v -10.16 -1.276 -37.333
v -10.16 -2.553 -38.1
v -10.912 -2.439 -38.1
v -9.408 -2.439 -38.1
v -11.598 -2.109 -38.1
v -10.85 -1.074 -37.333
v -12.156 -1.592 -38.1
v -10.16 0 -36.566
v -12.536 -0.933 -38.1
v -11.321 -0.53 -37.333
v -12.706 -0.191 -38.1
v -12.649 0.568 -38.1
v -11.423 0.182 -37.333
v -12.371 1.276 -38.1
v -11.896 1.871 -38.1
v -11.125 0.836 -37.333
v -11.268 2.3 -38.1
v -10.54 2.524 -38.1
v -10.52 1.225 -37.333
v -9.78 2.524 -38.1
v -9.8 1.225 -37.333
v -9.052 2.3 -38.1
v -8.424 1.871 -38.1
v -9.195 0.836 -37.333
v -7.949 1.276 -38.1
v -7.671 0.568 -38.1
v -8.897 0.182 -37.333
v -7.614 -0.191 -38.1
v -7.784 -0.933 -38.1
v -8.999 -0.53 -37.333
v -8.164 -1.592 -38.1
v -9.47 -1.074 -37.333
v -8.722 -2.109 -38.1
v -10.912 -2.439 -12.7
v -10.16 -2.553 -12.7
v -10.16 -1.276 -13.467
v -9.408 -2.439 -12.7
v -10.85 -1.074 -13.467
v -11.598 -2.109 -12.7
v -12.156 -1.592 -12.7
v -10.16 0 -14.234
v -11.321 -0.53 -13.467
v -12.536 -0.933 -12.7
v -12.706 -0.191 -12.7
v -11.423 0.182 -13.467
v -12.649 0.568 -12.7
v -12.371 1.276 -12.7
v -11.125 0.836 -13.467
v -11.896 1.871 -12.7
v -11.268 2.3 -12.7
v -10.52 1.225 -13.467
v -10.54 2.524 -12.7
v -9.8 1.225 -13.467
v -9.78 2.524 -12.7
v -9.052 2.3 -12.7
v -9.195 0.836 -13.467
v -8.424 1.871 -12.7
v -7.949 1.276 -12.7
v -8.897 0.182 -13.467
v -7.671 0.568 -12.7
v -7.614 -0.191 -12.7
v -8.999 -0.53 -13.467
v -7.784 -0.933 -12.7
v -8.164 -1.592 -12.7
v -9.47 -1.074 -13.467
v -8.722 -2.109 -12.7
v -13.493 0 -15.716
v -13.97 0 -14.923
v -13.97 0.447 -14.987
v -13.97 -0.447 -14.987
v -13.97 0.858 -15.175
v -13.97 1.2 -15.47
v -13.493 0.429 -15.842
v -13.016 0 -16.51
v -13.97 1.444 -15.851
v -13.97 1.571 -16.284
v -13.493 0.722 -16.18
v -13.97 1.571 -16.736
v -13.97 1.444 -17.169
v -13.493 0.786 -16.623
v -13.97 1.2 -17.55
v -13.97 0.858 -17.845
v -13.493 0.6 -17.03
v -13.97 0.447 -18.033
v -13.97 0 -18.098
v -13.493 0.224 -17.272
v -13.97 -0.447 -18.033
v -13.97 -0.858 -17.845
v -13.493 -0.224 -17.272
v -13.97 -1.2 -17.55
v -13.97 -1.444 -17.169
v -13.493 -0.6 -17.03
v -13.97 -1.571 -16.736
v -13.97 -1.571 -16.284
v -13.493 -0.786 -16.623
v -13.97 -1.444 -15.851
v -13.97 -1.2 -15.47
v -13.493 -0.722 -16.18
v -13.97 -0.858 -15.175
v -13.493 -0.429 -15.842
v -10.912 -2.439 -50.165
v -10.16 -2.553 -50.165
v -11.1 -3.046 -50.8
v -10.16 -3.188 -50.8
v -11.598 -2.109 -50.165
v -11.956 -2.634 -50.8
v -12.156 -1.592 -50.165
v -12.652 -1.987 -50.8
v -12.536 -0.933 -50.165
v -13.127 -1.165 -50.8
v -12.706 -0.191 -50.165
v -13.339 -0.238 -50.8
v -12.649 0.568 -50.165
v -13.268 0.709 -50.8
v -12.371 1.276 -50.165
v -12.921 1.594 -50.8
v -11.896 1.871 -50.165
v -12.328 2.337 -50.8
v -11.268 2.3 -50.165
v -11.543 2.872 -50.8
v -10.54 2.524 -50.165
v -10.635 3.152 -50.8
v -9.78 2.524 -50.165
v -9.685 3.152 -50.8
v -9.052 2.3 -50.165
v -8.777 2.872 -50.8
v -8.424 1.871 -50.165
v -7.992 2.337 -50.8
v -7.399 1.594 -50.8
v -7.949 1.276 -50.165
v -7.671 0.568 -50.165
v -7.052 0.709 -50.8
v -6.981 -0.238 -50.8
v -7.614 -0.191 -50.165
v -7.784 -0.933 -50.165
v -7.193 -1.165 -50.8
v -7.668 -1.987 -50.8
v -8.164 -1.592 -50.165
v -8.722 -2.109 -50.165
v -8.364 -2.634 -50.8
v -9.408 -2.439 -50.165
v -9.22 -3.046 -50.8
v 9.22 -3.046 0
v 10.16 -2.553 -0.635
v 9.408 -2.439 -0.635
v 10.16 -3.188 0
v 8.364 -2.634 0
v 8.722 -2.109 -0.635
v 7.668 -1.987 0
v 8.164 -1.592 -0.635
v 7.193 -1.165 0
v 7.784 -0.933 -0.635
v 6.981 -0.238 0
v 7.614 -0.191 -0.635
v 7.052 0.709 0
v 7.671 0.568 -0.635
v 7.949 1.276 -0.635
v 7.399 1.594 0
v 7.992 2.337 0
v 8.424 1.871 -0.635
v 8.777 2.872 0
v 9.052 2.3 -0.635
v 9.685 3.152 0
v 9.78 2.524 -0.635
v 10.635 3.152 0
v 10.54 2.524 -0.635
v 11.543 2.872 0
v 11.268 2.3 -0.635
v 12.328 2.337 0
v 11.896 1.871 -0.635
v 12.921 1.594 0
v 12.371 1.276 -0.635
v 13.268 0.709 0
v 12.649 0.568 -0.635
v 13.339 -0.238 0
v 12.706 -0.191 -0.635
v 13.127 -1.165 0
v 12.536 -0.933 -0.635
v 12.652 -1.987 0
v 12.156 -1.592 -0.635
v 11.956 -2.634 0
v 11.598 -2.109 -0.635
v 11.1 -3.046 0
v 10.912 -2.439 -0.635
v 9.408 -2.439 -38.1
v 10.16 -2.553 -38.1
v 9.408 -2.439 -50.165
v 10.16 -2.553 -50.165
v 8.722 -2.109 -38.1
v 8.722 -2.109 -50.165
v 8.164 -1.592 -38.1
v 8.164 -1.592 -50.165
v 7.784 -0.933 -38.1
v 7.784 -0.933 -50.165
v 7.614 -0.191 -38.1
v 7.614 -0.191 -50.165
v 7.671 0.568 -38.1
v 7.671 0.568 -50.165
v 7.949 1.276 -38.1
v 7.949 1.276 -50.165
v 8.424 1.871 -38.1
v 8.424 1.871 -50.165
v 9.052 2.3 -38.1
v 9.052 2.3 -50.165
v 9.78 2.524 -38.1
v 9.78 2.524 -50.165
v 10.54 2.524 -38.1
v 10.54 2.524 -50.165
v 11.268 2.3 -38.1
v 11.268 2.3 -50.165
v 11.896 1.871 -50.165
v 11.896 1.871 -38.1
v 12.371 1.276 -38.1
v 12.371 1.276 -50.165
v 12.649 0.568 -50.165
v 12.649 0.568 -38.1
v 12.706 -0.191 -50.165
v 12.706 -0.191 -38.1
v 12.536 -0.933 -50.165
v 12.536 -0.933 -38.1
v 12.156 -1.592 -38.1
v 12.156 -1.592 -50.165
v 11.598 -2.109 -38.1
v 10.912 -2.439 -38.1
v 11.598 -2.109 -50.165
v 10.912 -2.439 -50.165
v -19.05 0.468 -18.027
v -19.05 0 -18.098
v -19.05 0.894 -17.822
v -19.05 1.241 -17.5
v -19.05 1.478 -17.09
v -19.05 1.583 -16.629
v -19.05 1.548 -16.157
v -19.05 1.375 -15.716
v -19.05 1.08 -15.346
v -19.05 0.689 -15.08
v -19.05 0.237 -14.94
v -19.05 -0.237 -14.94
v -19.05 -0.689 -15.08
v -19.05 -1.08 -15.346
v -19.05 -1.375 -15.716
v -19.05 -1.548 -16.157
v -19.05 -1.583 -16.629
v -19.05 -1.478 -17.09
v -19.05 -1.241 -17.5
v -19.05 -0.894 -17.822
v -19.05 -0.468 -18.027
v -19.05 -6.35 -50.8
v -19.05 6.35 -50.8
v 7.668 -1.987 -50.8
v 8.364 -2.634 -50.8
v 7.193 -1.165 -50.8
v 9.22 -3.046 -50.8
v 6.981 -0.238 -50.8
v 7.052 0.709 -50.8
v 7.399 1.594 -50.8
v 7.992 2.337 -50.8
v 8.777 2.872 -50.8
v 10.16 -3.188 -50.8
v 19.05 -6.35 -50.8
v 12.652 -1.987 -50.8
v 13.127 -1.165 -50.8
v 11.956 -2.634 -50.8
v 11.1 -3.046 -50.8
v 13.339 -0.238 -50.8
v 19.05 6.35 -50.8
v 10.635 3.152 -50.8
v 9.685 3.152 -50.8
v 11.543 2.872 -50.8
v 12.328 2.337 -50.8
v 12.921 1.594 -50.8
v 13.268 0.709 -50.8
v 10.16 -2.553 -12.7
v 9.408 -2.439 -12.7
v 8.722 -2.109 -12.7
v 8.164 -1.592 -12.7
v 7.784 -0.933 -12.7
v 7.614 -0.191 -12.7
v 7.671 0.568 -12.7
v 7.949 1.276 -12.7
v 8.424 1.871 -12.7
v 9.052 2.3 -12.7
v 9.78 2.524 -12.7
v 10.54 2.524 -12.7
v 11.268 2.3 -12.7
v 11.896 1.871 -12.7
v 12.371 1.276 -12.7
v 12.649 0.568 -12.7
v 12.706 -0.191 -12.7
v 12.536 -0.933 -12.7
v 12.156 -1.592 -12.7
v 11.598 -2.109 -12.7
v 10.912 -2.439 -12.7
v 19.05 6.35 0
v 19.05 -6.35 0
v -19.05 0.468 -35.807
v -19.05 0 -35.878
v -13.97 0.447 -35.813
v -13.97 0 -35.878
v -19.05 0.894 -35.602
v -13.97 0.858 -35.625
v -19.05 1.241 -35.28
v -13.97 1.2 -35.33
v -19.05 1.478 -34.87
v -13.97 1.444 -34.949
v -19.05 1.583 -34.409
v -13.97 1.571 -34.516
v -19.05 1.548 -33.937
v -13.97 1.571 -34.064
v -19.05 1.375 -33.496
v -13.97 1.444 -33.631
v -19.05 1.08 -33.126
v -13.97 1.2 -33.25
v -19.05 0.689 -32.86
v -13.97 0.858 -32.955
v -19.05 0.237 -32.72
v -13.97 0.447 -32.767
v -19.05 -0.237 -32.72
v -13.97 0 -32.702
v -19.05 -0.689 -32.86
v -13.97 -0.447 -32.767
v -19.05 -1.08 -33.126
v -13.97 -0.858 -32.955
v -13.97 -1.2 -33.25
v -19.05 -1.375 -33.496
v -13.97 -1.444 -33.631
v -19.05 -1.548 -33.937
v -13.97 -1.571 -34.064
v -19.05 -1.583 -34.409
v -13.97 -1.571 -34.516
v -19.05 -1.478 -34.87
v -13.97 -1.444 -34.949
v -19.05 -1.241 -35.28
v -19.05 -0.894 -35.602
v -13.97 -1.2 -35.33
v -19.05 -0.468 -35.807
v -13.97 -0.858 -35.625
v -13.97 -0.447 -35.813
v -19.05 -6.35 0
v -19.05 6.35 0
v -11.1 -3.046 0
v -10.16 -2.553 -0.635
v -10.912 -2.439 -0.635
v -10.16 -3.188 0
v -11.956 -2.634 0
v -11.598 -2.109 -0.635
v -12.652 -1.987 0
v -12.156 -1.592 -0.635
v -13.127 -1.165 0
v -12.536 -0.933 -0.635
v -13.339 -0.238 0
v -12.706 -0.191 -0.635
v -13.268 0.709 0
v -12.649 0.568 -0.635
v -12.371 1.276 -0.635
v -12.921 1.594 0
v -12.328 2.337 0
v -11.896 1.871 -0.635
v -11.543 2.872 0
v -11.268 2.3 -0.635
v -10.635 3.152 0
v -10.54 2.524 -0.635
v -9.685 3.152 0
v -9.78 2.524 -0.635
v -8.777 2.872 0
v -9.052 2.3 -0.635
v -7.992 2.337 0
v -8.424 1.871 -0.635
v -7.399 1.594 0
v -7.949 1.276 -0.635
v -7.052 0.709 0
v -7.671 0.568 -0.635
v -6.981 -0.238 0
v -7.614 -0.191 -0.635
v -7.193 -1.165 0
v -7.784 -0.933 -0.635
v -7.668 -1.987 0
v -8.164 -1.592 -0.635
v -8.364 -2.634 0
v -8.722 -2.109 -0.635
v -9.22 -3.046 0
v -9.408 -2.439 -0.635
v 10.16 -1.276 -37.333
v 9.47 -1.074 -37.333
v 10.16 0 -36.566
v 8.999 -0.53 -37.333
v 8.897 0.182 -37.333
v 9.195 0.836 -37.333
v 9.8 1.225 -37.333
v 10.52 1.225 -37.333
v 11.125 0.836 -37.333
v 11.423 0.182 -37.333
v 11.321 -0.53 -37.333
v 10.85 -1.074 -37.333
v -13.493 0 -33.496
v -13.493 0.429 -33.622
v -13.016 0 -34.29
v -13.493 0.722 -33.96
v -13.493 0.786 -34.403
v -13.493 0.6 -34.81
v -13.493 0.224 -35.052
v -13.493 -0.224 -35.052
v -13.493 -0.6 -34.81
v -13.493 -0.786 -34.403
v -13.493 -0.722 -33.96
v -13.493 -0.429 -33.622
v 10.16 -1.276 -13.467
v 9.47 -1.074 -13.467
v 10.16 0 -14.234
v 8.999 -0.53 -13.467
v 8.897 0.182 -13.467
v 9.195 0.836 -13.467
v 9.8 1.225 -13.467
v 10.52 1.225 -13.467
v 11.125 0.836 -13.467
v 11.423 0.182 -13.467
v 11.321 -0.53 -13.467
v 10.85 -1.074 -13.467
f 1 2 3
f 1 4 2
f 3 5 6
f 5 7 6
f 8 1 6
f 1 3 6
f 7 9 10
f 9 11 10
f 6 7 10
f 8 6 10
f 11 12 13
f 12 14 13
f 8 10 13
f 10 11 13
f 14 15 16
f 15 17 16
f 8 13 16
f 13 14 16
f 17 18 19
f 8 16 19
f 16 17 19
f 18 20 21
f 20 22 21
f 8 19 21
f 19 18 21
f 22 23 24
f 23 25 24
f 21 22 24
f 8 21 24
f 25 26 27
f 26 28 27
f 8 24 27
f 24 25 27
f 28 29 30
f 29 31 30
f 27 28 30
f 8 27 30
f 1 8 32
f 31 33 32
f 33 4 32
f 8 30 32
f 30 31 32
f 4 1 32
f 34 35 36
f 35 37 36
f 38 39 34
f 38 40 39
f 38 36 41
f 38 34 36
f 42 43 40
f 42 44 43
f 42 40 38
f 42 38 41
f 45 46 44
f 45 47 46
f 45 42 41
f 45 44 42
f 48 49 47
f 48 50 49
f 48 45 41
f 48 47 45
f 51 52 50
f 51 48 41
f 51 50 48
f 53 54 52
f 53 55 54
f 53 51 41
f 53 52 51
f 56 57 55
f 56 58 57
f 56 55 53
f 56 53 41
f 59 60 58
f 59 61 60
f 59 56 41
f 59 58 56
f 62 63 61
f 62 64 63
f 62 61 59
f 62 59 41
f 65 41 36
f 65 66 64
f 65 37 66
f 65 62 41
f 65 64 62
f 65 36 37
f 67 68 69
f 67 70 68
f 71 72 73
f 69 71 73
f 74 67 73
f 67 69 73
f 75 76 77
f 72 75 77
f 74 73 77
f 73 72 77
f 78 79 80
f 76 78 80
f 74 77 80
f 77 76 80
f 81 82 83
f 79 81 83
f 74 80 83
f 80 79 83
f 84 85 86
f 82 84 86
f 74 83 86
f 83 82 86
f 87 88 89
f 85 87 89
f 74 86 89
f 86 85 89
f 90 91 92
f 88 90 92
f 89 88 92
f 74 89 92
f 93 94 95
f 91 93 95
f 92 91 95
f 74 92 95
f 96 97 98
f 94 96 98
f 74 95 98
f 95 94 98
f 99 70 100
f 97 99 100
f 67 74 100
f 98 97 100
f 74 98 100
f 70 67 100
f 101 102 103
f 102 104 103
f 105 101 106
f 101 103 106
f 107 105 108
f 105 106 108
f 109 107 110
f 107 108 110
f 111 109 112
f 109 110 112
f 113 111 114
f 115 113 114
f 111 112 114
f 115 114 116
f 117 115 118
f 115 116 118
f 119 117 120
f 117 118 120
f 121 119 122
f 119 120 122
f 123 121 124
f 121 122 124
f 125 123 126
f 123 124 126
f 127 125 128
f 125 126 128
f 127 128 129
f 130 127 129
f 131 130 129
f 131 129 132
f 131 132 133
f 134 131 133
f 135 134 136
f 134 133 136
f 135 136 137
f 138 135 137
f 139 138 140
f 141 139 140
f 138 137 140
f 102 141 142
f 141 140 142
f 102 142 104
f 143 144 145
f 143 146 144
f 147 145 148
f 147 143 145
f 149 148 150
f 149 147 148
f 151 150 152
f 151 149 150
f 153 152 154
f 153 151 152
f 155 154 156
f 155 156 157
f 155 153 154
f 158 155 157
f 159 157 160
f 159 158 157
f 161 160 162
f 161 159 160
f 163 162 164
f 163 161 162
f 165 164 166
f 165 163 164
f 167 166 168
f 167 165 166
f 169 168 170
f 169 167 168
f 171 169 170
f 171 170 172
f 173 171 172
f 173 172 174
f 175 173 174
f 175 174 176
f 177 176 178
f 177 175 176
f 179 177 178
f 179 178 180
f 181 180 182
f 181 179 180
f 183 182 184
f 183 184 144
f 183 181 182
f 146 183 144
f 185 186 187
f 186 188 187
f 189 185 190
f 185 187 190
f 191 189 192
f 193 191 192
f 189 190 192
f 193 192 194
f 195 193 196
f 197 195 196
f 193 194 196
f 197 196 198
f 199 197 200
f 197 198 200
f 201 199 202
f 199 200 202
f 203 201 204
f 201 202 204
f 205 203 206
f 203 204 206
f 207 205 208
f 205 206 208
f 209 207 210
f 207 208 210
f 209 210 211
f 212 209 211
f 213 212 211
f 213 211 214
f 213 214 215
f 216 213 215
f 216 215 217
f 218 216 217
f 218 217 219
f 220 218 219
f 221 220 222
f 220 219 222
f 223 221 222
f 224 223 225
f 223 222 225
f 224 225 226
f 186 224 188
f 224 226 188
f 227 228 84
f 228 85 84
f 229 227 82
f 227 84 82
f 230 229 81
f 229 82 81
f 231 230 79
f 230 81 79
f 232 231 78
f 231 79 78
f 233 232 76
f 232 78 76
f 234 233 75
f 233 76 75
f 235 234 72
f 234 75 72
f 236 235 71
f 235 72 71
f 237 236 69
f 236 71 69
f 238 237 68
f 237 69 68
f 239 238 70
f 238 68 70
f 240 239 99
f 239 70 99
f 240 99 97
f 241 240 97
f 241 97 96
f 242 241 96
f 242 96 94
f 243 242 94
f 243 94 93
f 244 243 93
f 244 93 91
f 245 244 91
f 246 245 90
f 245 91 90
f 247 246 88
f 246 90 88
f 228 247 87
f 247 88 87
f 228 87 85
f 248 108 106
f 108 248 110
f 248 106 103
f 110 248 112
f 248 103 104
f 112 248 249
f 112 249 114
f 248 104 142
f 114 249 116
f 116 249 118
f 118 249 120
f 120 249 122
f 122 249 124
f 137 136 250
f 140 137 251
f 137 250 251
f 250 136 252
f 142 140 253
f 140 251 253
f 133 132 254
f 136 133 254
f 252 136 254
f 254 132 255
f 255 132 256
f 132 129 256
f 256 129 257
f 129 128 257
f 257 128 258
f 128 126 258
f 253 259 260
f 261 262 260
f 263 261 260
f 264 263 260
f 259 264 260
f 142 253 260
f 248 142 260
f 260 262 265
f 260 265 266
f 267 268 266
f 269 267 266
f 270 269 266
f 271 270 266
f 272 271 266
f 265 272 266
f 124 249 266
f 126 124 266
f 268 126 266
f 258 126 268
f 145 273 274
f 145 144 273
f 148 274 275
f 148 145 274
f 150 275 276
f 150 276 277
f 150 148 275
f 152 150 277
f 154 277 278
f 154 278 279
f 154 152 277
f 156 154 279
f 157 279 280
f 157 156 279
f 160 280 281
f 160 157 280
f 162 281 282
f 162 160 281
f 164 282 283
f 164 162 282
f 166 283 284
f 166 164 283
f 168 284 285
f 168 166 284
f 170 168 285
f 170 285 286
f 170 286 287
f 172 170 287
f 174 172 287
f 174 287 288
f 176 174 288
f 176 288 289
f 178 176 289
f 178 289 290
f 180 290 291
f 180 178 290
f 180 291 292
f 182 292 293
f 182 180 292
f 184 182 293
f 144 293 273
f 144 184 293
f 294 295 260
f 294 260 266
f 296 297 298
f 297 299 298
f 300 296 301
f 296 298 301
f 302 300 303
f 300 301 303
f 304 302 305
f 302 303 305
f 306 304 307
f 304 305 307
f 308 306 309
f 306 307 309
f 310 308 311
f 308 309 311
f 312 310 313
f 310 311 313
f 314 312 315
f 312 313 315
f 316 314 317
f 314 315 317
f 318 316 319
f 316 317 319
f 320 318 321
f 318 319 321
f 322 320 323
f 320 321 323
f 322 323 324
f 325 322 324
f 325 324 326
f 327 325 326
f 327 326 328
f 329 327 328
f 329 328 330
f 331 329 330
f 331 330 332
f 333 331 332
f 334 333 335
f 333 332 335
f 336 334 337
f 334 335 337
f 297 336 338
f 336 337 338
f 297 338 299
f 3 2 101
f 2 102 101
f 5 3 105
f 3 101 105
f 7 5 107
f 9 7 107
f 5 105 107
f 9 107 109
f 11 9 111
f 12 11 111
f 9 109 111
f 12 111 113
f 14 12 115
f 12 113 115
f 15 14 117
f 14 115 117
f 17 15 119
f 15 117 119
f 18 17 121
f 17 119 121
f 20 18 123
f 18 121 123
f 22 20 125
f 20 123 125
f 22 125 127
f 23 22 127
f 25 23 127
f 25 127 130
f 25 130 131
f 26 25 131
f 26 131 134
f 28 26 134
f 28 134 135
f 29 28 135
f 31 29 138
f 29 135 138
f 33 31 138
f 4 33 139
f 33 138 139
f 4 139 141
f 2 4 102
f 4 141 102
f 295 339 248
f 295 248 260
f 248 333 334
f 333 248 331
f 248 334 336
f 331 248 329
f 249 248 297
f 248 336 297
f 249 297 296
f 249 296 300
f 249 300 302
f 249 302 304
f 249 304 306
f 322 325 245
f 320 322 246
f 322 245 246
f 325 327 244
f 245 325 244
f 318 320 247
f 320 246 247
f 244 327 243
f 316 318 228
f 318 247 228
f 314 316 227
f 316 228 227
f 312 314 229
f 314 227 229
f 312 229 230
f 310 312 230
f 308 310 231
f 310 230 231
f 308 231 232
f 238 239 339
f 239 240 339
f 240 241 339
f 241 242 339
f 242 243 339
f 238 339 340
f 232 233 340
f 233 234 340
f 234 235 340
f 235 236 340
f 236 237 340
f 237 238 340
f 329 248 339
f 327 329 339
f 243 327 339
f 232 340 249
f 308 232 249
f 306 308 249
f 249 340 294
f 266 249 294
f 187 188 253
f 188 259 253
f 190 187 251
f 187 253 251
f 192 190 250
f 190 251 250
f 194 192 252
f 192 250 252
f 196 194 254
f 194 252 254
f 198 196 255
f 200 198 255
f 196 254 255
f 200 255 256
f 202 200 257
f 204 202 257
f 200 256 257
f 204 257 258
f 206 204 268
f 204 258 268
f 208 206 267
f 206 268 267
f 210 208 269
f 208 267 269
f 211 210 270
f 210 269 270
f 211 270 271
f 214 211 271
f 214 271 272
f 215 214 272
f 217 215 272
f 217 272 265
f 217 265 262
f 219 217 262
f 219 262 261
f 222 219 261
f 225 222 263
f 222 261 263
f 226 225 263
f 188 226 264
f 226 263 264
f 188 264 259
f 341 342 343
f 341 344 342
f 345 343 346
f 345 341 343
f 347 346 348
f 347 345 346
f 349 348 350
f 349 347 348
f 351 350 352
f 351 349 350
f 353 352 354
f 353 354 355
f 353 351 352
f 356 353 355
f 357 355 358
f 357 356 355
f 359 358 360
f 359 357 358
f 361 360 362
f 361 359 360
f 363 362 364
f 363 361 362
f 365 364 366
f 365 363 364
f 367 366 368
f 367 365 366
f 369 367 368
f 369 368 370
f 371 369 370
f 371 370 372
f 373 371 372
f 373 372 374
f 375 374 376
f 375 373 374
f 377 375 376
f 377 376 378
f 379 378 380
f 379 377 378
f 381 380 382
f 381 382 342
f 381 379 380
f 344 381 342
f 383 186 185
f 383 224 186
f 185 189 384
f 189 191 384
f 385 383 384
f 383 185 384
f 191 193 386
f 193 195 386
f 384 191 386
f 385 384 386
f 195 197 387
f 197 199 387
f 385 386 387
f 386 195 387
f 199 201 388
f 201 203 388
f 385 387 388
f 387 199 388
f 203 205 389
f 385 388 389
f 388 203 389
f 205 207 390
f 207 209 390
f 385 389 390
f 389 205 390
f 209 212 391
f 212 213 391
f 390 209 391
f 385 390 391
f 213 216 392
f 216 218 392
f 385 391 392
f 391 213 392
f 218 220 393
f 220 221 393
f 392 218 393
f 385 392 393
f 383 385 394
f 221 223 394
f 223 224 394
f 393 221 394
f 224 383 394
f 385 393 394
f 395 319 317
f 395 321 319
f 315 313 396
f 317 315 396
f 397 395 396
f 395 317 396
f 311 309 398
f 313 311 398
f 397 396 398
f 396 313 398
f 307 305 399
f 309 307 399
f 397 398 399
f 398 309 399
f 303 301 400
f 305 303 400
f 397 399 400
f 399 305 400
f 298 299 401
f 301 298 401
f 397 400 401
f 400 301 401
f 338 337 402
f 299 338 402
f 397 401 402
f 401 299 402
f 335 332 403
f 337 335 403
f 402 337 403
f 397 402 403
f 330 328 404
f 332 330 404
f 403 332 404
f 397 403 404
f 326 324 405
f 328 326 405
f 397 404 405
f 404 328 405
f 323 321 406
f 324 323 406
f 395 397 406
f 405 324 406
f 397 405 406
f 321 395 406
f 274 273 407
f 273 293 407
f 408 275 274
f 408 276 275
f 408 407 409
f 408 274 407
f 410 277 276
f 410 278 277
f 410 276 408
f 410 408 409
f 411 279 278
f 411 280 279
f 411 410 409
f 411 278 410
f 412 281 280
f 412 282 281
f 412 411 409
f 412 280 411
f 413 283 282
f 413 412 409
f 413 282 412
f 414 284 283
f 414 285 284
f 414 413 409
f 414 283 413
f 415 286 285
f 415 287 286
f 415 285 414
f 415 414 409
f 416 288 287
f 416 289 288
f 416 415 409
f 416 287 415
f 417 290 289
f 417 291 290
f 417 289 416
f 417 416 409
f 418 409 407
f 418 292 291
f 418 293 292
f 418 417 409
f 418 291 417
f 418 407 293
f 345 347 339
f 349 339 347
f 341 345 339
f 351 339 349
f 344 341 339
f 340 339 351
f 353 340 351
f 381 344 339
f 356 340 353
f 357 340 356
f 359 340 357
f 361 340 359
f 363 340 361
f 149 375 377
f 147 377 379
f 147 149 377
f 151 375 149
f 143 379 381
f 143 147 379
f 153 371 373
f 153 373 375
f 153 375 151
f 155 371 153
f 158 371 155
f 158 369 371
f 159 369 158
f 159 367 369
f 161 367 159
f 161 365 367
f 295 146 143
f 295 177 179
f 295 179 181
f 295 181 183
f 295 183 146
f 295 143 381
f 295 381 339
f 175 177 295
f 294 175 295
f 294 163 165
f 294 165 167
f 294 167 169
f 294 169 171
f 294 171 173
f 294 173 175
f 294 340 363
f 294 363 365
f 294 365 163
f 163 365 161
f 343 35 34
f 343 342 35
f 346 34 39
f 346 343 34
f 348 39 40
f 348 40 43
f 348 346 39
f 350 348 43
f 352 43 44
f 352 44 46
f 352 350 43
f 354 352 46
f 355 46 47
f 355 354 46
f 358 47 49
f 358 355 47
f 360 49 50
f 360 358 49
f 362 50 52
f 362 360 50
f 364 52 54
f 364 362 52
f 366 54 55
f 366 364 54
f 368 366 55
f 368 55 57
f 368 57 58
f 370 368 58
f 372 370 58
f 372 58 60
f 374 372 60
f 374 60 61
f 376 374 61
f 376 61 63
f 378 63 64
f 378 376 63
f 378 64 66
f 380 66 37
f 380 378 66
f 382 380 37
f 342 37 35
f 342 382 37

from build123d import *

# Parameters (mm, degrees)
SKETCH1_W                        = 38.1
SKETCH1_H                        = 12.7
BOSS_EXTRUDE1_DEPTH              = 50.8
F_1_4_20_TAPPED_HOLE1_AT_2_COUNT = 2
F_1_4_20_TAPPED_HOLE1_AT_2_PITCH = 20.32
F_1_8_0_125_DIAMETER_HOLE1_D     = 3.175
F_1_8_0_125_DIAMETER_HOLE1_DEPTH = 5.08
F_1_8_0_125_DIAMETER_HOLE1_TIP   = 0.953866233


with BuildPart() as part:
    # Sketch1 → Boss-Extrude1 (new body)
    with BuildSketch(Plane.XY):
        Rectangle(SKETCH1_W, SKETCH1_H)
    extrude(amount=-BOSS_EXTRUDE1_DEPTH)

    # Sketch4 → 1/4-20 Tapped Hole1 (revolve, cut)
    with BuildSketch(Plane(origin=(-10.16, 0, 0), x_dir=(0, -1, 0), z_dir=(1, 0, 0))):
        Polygon((0, 0), (0, 14.233816902), (2.5527, 12.7), (2.5527, 0.635), (3.1877, 0), align=None)
    f_1_4_20_tapped_hole1 = revolve(axis=Axis((-10.16, 0, 6.35), (0, 0, -1)), mode=Mode.SUBTRACT)

    # 1/4-20 Tapped Hole1 at 2: 1/4-20 Tapped Hole1 ×2
    with Locations(*[(i * F_1_4_20_TAPPED_HOLE1_AT_2_PITCH, 0, 0) for i in range(1, F_1_4_20_TAPPED_HOLE1_AT_2_COUNT)]):
        add(f_1_4_20_tapped_hole1, mode=Mode.SUBTRACT)

    # Mirror1: 1/4-20 Tapped Hole1 across plane
    add(f_1_4_20_tapped_hole1.mirror(Plane.XY.offset(-25.4)), mode=Mode.SUBTRACT)

    # Mirror1 copy 1 sketch → Mirror1 copy 1 (revolve, cut)
    with BuildSketch(Plane(origin=(10.16, 0, -50.8), x_dir=(0, -1, 0), z_dir=(1, 0, 0))):
        Polygon((0, 0), (0, -14.233816902), (2.5527, -12.7), (2.5527, -0.635), (3.1877, 0), align=None)
    revolve(axis=Axis((10.16, 0, -57.15), (0, 0, -1)), mode=Mode.SUBTRACT)

    # 1/8 (0.125) Diameter Hole1
    with Locations(Plane.ZY.offset(19.05)):
        with Locations((-34.29, 0), (-16.51, 0)):
            Hole(F_1_8_0_125_DIAMETER_HOLE1_D / 2, depth=F_1_8_0_125_DIAMETER_HOLE1_DEPTH)
            with Locations((0, 0, -(F_1_8_0_125_DIAMETER_HOLE1_DEPTH + F_1_8_0_125_DIAMETER_HOLE1_TIP / 2))):  # 118° drill point
                Cone(0, F_1_8_0_125_DIAMETER_HOLE1_D / 2, F_1_8_0_125_DIAMETER_HOLE1_TIP, mode=Mode.SUBTRACT)


solid = part.part
